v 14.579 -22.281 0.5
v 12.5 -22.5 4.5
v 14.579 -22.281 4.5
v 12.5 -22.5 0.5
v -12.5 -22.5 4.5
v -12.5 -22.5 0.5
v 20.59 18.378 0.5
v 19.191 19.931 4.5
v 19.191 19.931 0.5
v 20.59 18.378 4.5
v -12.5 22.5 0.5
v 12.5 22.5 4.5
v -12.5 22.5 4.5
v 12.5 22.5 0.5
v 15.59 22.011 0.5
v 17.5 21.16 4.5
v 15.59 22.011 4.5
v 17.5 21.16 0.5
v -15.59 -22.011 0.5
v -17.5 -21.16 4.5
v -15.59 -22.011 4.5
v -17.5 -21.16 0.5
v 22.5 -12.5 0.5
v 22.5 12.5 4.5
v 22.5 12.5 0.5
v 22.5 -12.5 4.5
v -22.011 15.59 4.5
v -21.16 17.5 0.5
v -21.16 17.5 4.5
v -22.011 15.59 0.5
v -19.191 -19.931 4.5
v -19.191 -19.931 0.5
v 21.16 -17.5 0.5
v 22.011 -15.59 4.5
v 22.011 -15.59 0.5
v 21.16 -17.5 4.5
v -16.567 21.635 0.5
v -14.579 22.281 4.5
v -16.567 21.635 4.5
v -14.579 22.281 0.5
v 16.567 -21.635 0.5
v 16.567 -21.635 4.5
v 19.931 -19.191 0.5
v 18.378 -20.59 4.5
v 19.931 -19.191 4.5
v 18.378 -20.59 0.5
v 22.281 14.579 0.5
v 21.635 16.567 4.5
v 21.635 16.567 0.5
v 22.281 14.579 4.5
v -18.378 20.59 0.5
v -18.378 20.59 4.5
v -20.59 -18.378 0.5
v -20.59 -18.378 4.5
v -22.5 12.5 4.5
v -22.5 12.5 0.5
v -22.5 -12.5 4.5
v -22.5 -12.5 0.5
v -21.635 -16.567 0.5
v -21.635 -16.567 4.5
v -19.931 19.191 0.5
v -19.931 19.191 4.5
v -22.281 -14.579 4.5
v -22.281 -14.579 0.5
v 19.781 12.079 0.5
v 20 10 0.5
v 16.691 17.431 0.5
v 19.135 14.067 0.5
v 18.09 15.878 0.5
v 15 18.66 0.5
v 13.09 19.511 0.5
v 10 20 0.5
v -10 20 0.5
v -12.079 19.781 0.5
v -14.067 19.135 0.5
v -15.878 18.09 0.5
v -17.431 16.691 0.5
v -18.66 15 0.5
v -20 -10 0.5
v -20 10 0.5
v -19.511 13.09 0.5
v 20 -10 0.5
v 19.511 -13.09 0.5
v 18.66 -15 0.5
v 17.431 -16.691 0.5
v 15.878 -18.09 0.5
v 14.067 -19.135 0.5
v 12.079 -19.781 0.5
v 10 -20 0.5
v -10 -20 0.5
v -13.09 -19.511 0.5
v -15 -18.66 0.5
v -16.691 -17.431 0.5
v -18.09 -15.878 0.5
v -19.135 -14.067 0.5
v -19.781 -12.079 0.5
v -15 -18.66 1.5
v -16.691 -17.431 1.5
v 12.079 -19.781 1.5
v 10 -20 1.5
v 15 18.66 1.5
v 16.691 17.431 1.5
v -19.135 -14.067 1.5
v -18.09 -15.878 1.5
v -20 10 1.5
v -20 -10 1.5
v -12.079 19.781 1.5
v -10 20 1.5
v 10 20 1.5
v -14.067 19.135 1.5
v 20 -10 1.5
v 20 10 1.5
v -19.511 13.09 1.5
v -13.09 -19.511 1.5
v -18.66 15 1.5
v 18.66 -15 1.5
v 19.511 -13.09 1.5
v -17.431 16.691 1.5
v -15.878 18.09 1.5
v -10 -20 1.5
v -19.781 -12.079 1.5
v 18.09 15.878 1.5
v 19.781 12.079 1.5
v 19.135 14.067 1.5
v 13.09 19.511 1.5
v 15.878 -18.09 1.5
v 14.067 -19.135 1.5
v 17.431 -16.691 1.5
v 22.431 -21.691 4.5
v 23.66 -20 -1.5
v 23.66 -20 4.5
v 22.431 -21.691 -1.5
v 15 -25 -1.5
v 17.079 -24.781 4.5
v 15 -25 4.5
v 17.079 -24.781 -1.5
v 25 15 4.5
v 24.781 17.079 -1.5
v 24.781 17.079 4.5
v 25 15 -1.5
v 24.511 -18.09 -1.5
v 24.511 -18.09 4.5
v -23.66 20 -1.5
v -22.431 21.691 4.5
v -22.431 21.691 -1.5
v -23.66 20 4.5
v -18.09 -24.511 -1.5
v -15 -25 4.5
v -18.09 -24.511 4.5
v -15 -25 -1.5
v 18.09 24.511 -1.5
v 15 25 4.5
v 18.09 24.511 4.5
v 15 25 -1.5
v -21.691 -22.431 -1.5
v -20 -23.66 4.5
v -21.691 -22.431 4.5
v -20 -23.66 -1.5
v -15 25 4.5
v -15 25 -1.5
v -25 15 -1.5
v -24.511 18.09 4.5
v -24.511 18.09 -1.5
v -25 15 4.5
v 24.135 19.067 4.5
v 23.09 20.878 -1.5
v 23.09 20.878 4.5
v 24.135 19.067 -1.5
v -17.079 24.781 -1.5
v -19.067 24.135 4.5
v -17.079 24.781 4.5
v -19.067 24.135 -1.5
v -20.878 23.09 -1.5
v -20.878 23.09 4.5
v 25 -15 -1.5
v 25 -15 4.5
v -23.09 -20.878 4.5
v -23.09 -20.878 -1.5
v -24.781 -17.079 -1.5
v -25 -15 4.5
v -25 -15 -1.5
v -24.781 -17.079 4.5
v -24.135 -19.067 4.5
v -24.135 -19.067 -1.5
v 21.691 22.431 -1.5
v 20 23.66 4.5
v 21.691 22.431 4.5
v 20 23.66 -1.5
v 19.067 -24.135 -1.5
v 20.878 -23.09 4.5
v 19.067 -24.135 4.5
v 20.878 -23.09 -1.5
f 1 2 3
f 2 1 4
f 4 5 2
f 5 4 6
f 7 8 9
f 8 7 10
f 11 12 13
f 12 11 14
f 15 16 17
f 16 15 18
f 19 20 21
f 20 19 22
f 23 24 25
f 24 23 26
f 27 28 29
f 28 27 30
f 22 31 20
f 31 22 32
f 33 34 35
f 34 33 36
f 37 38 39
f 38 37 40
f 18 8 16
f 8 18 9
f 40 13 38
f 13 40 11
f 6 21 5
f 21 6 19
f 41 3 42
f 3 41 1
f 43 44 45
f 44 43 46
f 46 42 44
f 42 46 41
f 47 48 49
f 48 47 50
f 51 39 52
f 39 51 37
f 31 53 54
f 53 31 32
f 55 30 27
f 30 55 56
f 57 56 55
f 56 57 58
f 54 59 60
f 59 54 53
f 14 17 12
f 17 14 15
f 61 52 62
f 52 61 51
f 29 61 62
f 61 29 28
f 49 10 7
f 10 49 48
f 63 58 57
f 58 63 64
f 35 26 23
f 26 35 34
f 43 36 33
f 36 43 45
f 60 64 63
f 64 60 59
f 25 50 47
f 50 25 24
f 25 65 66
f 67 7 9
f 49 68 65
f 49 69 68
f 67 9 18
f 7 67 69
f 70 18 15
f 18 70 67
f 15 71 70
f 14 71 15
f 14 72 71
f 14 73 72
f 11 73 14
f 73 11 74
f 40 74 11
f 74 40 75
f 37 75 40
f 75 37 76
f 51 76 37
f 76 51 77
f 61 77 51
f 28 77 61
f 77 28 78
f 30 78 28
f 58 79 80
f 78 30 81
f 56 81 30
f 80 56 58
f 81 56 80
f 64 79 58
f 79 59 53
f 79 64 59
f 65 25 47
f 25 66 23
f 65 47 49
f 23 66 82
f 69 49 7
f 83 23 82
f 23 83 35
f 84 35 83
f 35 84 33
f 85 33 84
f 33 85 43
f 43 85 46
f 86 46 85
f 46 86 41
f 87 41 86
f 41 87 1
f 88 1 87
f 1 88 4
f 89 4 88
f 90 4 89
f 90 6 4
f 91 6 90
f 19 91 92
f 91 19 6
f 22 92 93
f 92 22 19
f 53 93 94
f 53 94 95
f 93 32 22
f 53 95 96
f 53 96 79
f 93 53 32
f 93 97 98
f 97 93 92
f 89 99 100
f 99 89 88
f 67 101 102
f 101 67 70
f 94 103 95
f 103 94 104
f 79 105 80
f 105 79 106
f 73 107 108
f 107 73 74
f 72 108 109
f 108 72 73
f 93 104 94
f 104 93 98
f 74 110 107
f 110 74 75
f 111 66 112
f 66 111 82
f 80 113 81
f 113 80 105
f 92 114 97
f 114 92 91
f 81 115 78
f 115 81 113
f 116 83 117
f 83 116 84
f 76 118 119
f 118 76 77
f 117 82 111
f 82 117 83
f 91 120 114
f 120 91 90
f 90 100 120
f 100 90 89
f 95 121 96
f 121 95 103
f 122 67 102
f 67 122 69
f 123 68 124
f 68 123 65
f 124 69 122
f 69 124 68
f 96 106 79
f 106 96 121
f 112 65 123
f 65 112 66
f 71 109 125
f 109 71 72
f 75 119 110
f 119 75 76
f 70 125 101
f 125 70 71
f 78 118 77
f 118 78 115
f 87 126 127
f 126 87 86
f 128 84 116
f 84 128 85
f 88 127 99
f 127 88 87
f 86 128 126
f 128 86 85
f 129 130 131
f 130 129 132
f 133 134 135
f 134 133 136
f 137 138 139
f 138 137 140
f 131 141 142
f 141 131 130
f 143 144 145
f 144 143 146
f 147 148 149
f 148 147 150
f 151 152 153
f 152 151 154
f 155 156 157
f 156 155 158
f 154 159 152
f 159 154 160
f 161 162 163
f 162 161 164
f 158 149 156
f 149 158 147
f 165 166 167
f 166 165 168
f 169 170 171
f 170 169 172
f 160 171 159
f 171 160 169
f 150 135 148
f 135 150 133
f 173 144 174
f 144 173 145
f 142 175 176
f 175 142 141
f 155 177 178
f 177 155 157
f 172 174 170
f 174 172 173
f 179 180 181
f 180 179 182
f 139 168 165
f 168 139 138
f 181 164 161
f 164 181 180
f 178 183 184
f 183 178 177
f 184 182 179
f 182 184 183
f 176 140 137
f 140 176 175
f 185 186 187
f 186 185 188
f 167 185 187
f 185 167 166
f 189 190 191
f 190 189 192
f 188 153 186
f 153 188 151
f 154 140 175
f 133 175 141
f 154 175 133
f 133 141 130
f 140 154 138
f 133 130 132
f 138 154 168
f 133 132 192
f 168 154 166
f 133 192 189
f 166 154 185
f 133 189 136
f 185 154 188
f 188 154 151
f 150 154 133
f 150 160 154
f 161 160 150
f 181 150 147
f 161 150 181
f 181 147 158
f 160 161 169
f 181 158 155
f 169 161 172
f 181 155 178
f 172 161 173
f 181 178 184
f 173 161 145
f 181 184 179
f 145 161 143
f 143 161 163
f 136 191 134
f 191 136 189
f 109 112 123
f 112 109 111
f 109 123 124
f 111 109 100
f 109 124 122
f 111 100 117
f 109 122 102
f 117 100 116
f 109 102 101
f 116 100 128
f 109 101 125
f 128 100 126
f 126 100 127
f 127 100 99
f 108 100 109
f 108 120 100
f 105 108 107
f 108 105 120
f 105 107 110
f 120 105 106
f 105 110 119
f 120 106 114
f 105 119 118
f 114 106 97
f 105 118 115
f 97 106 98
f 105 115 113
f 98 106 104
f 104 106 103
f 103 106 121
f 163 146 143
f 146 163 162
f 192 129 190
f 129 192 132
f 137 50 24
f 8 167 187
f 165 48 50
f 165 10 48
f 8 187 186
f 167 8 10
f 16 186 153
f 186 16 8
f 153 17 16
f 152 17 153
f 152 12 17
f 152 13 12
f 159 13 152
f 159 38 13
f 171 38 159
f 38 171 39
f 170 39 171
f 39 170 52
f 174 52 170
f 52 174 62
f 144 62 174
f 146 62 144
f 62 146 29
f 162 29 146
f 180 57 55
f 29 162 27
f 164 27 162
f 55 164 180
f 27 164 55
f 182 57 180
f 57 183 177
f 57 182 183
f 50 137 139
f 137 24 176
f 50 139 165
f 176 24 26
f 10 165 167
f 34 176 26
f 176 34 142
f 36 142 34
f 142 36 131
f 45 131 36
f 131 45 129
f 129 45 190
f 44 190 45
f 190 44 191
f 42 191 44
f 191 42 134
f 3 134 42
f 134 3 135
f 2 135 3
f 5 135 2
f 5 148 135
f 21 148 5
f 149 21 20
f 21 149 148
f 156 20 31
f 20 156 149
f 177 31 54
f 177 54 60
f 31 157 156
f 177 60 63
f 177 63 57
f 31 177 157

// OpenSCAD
/*
 * Test for a stamp mold
 */
echo(version=version());

logo = "./images/chloe.04.small.png"; 
imgRatio = 1.5;
logox = 500 * imgRatio; 
logoy = 493 * imgRatio; 

module roundedRect(size, radius) {  
	linear_extrude(height=size.z, center=true) {
		offset(radius) offset(-radius) {
			square([size.x, size.y], center = true);
		}
	}
}

// Base plate
// ----------
plateWidth = 50;
plateLength = 50;
plateThickNess = 3;
cornerRadius = 10;

difference() {  
	union() {
		difference() {
			roundedRect([plateWidth, plateLength, plateThickNess], cornerRadius);
			translate([0, 0, 2]) {
				scale([.9 * plateWidth / logox, .9 * plateWidth / logoy, .02]) {
					color("white") {
						rotate([0, 0, -90]) {
							surface(file=logo, invert=true, center=true);
						}
					}
				}
        // the groove around the picture
        difference() {
          roundedRect([plateWidth -  5, plateLength -  5, plateThickNess], cornerRadius);
          roundedRect([plateWidth - 10, plateLength - 10, plateThickNess * 1.1], cornerRadius);
        }
			}
		}
		// The frame
		translate([0, 0, (plateThickNess / 1)]) {
			difference() {
				roundedRect([plateWidth, plateLength, plateThickNess], cornerRadius);
				roundedRect([plateWidth - 5, plateLength - 5, plateThickNess * 1.1], cornerRadius);
			}
		}
	}
}
